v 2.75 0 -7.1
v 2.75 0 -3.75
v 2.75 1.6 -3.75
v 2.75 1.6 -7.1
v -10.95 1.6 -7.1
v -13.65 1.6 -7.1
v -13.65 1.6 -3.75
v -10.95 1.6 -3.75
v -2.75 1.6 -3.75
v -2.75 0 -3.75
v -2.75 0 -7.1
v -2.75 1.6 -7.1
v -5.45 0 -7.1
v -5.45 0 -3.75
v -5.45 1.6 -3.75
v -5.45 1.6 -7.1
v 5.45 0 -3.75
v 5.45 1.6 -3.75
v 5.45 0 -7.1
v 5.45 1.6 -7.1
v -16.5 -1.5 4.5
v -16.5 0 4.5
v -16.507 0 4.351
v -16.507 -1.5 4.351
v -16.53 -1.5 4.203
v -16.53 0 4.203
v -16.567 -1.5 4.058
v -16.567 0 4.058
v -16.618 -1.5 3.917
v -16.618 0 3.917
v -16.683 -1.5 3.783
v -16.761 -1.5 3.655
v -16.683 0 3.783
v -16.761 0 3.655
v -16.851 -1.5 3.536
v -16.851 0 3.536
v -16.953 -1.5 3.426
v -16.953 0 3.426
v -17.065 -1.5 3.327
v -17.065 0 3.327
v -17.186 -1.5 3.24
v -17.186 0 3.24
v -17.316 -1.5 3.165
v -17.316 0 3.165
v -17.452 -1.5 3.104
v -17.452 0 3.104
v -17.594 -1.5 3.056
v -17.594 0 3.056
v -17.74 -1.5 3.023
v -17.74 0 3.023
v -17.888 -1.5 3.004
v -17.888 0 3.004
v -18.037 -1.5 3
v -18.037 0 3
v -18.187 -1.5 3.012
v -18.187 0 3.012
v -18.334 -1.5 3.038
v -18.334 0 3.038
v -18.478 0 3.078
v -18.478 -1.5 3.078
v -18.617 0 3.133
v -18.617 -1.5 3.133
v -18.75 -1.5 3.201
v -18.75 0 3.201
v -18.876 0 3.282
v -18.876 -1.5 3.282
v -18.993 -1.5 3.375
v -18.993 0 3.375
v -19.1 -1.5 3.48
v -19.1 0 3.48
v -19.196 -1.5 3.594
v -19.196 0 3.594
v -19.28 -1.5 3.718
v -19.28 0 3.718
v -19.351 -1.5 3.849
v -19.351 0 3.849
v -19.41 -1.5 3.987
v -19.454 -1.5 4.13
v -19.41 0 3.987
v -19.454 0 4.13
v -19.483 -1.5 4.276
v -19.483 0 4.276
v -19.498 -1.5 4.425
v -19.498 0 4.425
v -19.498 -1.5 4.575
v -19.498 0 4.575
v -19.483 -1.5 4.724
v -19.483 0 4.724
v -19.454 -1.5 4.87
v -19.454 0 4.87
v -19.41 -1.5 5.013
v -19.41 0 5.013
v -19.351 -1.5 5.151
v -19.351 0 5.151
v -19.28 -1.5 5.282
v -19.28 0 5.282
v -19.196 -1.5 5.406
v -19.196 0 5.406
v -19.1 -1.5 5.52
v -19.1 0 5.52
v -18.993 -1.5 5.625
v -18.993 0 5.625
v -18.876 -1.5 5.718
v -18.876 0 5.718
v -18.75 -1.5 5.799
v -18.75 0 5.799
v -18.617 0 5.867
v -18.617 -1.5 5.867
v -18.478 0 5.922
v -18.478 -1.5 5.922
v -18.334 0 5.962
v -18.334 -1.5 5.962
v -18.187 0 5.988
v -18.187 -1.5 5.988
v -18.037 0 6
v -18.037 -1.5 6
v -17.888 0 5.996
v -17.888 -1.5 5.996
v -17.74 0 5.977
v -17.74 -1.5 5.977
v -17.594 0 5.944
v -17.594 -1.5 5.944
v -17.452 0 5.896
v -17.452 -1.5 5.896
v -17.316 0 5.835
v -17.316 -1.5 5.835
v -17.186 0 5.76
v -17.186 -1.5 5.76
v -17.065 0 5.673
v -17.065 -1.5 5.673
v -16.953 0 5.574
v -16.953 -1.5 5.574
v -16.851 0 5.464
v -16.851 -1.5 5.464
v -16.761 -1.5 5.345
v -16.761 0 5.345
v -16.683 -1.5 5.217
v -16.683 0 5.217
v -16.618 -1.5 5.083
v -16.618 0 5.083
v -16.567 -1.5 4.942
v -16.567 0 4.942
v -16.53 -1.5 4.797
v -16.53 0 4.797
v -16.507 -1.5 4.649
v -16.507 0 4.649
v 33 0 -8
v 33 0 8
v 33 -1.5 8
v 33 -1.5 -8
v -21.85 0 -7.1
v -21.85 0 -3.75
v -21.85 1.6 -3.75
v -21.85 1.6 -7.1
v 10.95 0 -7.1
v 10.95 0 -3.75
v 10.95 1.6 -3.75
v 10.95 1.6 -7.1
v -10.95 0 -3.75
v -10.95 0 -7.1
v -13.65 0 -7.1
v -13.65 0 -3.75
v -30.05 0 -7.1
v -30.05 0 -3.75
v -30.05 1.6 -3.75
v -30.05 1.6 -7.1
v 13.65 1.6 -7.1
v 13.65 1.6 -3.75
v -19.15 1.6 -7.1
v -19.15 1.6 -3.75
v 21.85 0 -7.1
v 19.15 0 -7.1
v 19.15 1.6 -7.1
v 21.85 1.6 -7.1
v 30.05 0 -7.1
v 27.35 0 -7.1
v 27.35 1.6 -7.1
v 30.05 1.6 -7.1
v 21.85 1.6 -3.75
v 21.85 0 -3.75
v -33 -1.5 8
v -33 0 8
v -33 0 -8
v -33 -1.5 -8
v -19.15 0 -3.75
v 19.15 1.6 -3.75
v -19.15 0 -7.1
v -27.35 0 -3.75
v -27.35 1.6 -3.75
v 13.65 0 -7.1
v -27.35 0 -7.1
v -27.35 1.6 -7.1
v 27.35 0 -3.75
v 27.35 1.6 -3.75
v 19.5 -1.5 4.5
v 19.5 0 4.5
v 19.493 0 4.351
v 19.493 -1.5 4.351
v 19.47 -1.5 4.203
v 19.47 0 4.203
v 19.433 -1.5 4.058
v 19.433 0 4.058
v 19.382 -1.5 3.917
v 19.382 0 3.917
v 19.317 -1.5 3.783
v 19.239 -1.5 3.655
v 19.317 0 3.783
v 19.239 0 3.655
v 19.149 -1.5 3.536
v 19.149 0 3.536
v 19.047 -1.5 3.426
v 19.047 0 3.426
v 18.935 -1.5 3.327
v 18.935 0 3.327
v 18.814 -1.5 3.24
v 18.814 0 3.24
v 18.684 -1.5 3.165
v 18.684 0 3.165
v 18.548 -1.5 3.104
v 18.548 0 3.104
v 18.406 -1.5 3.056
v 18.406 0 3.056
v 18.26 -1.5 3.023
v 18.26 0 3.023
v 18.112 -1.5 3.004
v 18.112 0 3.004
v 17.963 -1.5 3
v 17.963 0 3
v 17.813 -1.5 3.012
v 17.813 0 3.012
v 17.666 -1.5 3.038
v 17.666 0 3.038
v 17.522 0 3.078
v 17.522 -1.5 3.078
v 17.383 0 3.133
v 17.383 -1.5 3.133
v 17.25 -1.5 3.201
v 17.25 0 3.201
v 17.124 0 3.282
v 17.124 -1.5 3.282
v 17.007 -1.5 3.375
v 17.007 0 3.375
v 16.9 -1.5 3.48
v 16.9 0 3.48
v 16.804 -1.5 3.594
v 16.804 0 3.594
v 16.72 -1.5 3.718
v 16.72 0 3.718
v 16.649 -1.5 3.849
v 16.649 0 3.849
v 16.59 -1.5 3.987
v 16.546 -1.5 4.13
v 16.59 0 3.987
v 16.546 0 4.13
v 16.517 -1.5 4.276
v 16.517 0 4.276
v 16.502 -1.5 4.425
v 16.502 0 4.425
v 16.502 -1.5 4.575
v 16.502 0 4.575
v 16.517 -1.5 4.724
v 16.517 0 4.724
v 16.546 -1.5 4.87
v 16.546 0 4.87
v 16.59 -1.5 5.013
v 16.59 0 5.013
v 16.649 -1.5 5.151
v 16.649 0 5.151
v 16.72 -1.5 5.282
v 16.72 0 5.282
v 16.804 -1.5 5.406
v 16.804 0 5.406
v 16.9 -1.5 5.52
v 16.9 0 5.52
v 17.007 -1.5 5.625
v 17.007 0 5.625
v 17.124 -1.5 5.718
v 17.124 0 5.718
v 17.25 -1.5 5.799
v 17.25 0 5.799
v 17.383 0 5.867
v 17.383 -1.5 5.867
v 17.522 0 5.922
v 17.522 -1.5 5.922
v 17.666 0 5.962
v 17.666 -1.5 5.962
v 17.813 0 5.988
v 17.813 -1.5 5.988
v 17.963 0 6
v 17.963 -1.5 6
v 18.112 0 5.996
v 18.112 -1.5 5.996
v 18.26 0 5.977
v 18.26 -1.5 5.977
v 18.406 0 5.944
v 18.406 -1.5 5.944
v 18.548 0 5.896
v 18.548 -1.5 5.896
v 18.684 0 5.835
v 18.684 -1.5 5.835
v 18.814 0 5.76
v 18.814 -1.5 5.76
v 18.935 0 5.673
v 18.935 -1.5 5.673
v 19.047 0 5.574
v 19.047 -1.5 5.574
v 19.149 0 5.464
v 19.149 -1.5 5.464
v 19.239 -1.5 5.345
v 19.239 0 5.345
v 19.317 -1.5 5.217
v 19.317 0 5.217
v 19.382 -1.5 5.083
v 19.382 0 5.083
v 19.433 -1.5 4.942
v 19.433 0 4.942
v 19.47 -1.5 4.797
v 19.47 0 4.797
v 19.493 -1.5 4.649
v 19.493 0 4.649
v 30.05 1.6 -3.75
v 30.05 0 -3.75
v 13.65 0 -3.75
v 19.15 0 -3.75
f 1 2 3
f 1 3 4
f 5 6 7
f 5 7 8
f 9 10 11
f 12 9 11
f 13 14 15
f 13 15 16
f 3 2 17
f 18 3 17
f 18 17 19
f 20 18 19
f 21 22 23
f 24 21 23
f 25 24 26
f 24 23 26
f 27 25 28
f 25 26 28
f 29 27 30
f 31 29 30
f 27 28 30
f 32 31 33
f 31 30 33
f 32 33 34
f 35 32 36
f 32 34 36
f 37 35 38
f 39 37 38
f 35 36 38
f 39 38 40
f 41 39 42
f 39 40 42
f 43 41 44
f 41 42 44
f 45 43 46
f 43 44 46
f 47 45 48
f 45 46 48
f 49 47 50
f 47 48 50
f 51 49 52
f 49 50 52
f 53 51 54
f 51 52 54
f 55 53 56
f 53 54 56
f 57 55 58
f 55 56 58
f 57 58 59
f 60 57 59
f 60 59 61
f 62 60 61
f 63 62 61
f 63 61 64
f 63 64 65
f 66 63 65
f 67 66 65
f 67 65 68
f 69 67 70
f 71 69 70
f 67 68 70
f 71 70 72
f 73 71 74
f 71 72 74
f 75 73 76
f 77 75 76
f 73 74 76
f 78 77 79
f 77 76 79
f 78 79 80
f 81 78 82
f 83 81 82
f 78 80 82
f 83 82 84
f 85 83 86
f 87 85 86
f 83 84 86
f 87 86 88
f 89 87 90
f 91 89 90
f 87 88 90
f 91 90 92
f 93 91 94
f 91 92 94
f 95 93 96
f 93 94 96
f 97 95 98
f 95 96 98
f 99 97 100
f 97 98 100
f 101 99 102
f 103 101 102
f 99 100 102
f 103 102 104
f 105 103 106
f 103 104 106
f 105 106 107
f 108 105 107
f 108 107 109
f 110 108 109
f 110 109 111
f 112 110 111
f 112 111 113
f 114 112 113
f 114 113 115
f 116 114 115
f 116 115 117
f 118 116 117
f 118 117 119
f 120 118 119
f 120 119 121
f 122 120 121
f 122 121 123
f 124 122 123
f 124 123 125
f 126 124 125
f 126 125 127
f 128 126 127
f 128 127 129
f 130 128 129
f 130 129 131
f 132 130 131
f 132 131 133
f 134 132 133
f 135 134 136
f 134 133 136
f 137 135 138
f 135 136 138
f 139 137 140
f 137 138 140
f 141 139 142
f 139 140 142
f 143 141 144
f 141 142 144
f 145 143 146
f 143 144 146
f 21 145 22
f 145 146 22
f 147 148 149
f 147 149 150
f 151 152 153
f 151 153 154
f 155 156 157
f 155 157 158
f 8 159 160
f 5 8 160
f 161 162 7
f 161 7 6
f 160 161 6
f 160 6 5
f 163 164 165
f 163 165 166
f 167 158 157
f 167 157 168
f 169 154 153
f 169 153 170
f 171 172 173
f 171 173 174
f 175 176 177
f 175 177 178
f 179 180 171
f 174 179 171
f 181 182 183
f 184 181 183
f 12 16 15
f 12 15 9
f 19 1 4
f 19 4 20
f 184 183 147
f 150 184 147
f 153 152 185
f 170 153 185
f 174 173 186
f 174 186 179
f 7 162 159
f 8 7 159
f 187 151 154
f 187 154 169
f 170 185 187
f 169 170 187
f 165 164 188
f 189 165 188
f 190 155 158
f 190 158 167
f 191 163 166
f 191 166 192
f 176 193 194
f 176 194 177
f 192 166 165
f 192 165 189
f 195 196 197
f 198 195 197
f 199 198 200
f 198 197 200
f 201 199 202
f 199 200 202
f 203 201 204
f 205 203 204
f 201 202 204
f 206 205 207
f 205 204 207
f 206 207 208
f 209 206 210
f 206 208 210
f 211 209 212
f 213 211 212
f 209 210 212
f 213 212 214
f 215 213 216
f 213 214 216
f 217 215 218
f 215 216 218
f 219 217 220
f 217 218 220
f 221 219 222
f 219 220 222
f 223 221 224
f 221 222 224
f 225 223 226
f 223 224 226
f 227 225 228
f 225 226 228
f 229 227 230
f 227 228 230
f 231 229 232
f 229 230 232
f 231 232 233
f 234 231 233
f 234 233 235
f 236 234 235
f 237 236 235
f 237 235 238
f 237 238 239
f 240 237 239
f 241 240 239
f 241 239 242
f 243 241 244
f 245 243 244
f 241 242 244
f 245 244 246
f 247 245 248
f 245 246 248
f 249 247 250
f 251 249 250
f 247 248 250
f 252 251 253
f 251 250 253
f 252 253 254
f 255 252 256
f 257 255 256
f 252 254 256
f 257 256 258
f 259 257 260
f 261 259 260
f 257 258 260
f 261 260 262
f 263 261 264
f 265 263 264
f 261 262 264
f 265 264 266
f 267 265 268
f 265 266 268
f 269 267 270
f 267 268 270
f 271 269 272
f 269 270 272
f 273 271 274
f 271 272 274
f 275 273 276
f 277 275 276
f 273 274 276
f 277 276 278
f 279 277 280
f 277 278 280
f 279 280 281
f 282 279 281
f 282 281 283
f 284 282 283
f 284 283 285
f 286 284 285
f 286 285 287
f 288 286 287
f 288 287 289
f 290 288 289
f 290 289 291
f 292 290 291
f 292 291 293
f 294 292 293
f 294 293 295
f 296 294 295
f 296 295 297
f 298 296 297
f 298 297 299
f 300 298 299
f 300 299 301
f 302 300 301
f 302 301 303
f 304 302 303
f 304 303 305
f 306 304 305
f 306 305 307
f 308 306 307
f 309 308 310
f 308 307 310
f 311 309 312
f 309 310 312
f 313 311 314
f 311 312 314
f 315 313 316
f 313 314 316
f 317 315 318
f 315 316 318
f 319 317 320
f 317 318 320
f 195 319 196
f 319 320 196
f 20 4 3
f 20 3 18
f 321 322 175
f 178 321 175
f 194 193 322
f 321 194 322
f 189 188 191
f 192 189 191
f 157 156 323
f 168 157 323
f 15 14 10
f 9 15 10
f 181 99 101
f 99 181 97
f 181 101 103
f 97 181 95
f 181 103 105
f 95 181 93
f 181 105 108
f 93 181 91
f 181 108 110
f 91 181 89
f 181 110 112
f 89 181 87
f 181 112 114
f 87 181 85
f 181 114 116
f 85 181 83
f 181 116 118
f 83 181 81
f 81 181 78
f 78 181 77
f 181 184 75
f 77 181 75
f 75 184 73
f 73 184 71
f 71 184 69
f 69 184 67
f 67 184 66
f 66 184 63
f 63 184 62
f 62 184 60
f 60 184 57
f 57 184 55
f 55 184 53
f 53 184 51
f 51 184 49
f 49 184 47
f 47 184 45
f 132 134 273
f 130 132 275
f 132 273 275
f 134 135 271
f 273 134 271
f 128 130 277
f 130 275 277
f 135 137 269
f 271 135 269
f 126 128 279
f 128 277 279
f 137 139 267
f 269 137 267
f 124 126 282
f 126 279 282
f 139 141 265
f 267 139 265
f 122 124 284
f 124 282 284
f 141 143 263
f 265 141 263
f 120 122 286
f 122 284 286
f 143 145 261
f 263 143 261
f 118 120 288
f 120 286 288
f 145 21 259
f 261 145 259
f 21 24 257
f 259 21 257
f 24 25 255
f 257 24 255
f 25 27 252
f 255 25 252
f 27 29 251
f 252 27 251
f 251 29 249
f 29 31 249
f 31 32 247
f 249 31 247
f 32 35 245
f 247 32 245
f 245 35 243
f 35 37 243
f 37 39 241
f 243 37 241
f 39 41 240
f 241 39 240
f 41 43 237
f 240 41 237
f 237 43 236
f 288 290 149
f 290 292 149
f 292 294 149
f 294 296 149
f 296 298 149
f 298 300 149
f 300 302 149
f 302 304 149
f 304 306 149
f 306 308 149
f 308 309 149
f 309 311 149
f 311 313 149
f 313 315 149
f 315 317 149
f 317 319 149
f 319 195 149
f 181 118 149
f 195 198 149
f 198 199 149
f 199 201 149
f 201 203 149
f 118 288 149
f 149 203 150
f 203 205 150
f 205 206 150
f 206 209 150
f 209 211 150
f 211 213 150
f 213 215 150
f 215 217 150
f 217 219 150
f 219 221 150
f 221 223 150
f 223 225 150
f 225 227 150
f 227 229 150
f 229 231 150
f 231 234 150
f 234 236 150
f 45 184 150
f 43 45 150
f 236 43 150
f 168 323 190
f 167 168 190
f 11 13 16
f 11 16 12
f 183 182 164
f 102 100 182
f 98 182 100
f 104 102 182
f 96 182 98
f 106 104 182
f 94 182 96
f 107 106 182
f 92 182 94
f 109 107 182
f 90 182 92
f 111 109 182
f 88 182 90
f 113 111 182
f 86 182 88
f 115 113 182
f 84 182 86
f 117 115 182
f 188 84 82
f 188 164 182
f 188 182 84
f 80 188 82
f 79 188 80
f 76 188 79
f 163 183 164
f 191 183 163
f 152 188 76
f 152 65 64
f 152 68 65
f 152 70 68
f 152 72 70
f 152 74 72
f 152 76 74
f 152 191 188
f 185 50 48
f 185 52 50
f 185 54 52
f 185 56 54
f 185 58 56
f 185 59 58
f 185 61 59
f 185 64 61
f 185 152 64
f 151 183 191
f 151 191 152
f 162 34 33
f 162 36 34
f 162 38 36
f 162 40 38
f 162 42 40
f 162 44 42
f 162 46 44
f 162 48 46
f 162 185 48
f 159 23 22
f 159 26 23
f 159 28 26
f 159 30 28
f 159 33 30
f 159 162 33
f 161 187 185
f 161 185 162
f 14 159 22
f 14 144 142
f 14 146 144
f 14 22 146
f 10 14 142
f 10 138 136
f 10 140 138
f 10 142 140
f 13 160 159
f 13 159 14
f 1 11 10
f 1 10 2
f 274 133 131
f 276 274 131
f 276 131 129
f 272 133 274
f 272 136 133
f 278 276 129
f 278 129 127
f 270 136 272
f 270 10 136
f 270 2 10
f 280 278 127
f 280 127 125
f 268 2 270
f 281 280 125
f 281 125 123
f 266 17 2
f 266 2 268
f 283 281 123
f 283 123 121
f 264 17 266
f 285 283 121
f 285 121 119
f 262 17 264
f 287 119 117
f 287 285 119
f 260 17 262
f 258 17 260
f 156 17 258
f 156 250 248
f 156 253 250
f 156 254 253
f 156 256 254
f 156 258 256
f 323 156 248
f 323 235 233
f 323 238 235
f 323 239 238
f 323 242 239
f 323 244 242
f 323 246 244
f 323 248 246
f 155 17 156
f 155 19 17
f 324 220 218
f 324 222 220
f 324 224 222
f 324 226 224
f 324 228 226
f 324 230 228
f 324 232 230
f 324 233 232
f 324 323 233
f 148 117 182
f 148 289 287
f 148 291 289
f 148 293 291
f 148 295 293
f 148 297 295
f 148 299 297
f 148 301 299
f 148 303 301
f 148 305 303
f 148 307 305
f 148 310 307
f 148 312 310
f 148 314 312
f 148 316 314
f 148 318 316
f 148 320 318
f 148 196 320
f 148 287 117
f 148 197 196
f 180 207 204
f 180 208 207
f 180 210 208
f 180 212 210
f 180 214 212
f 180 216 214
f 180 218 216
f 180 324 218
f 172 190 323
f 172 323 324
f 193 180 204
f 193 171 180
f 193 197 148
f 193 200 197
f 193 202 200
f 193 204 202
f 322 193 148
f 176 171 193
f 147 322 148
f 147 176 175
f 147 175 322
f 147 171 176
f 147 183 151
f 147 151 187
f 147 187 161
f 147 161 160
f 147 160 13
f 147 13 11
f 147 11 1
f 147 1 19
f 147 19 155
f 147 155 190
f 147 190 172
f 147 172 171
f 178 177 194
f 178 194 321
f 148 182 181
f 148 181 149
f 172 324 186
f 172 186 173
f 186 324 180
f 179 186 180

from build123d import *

# Parameters (mm, degrees)
SKETCH1_W           = 66
SKETCH1_H           = 16
SKETCH1_R           = 1.5
BOSS_EXTRUDE1_DEPTH = 1.5
SKETCH4_W           = 2.7
SKETCH4_H           = 3.35
BOSS_EXTRUDE4_DEPTH = 1.6


with BuildPart() as part:
    # Sketch1 → Boss-Extrude1 (new body)
    with BuildSketch(Plane(origin=(0, 0, 0), x_dir=(1, 0, 0), z_dir=(0, 1, 0))):
        Rectangle(SKETCH1_W, SKETCH1_H)
        with Locations((-18, -4.5)):
            Circle(SKETCH1_R, mode=Mode.SUBTRACT)
        with Locations((18, -4.5)):
            Circle(SKETCH1_R, mode=Mode.SUBTRACT)
    extrude(amount=-BOSS_EXTRUDE1_DEPTH)

    # Sketch4 → Boss-Extrude4 (add)
    with BuildSketch(Plane(origin=(0, 0, 0), x_dir=(1, 0, 0), z_dir=(0, 1, 0))):
        with Locations((-4.1, 5.425)):
            Rectangle(SKETCH4_W, SKETCH4_H)
        with Locations((4.1, 5.425)):
            Rectangle(SKETCH4_W, SKETCH4_H)
        with Locations((12.3, 5.425)):
            Rectangle(SKETCH4_W, SKETCH4_H)
        with Locations((20.5, 5.425)):
            Rectangle(SKETCH4_W, SKETCH4_H)
        with Locations((28.7, 5.425)):
            Rectangle(SKETCH4_W, SKETCH4_H)
        with Locations((-12.3, 5.425)):
            Rectangle(SKETCH4_W, SKETCH4_H)
        with Locations((-28.7, 5.425)):
            Rectangle(SKETCH4_W, SKETCH4_H)
        with Locations((-20.5, 5.425)):
            Rectangle(SKETCH4_W, SKETCH4_H)
    extrude(amount=BOSS_EXTRUDE4_DEPTH)


solid = part.part
